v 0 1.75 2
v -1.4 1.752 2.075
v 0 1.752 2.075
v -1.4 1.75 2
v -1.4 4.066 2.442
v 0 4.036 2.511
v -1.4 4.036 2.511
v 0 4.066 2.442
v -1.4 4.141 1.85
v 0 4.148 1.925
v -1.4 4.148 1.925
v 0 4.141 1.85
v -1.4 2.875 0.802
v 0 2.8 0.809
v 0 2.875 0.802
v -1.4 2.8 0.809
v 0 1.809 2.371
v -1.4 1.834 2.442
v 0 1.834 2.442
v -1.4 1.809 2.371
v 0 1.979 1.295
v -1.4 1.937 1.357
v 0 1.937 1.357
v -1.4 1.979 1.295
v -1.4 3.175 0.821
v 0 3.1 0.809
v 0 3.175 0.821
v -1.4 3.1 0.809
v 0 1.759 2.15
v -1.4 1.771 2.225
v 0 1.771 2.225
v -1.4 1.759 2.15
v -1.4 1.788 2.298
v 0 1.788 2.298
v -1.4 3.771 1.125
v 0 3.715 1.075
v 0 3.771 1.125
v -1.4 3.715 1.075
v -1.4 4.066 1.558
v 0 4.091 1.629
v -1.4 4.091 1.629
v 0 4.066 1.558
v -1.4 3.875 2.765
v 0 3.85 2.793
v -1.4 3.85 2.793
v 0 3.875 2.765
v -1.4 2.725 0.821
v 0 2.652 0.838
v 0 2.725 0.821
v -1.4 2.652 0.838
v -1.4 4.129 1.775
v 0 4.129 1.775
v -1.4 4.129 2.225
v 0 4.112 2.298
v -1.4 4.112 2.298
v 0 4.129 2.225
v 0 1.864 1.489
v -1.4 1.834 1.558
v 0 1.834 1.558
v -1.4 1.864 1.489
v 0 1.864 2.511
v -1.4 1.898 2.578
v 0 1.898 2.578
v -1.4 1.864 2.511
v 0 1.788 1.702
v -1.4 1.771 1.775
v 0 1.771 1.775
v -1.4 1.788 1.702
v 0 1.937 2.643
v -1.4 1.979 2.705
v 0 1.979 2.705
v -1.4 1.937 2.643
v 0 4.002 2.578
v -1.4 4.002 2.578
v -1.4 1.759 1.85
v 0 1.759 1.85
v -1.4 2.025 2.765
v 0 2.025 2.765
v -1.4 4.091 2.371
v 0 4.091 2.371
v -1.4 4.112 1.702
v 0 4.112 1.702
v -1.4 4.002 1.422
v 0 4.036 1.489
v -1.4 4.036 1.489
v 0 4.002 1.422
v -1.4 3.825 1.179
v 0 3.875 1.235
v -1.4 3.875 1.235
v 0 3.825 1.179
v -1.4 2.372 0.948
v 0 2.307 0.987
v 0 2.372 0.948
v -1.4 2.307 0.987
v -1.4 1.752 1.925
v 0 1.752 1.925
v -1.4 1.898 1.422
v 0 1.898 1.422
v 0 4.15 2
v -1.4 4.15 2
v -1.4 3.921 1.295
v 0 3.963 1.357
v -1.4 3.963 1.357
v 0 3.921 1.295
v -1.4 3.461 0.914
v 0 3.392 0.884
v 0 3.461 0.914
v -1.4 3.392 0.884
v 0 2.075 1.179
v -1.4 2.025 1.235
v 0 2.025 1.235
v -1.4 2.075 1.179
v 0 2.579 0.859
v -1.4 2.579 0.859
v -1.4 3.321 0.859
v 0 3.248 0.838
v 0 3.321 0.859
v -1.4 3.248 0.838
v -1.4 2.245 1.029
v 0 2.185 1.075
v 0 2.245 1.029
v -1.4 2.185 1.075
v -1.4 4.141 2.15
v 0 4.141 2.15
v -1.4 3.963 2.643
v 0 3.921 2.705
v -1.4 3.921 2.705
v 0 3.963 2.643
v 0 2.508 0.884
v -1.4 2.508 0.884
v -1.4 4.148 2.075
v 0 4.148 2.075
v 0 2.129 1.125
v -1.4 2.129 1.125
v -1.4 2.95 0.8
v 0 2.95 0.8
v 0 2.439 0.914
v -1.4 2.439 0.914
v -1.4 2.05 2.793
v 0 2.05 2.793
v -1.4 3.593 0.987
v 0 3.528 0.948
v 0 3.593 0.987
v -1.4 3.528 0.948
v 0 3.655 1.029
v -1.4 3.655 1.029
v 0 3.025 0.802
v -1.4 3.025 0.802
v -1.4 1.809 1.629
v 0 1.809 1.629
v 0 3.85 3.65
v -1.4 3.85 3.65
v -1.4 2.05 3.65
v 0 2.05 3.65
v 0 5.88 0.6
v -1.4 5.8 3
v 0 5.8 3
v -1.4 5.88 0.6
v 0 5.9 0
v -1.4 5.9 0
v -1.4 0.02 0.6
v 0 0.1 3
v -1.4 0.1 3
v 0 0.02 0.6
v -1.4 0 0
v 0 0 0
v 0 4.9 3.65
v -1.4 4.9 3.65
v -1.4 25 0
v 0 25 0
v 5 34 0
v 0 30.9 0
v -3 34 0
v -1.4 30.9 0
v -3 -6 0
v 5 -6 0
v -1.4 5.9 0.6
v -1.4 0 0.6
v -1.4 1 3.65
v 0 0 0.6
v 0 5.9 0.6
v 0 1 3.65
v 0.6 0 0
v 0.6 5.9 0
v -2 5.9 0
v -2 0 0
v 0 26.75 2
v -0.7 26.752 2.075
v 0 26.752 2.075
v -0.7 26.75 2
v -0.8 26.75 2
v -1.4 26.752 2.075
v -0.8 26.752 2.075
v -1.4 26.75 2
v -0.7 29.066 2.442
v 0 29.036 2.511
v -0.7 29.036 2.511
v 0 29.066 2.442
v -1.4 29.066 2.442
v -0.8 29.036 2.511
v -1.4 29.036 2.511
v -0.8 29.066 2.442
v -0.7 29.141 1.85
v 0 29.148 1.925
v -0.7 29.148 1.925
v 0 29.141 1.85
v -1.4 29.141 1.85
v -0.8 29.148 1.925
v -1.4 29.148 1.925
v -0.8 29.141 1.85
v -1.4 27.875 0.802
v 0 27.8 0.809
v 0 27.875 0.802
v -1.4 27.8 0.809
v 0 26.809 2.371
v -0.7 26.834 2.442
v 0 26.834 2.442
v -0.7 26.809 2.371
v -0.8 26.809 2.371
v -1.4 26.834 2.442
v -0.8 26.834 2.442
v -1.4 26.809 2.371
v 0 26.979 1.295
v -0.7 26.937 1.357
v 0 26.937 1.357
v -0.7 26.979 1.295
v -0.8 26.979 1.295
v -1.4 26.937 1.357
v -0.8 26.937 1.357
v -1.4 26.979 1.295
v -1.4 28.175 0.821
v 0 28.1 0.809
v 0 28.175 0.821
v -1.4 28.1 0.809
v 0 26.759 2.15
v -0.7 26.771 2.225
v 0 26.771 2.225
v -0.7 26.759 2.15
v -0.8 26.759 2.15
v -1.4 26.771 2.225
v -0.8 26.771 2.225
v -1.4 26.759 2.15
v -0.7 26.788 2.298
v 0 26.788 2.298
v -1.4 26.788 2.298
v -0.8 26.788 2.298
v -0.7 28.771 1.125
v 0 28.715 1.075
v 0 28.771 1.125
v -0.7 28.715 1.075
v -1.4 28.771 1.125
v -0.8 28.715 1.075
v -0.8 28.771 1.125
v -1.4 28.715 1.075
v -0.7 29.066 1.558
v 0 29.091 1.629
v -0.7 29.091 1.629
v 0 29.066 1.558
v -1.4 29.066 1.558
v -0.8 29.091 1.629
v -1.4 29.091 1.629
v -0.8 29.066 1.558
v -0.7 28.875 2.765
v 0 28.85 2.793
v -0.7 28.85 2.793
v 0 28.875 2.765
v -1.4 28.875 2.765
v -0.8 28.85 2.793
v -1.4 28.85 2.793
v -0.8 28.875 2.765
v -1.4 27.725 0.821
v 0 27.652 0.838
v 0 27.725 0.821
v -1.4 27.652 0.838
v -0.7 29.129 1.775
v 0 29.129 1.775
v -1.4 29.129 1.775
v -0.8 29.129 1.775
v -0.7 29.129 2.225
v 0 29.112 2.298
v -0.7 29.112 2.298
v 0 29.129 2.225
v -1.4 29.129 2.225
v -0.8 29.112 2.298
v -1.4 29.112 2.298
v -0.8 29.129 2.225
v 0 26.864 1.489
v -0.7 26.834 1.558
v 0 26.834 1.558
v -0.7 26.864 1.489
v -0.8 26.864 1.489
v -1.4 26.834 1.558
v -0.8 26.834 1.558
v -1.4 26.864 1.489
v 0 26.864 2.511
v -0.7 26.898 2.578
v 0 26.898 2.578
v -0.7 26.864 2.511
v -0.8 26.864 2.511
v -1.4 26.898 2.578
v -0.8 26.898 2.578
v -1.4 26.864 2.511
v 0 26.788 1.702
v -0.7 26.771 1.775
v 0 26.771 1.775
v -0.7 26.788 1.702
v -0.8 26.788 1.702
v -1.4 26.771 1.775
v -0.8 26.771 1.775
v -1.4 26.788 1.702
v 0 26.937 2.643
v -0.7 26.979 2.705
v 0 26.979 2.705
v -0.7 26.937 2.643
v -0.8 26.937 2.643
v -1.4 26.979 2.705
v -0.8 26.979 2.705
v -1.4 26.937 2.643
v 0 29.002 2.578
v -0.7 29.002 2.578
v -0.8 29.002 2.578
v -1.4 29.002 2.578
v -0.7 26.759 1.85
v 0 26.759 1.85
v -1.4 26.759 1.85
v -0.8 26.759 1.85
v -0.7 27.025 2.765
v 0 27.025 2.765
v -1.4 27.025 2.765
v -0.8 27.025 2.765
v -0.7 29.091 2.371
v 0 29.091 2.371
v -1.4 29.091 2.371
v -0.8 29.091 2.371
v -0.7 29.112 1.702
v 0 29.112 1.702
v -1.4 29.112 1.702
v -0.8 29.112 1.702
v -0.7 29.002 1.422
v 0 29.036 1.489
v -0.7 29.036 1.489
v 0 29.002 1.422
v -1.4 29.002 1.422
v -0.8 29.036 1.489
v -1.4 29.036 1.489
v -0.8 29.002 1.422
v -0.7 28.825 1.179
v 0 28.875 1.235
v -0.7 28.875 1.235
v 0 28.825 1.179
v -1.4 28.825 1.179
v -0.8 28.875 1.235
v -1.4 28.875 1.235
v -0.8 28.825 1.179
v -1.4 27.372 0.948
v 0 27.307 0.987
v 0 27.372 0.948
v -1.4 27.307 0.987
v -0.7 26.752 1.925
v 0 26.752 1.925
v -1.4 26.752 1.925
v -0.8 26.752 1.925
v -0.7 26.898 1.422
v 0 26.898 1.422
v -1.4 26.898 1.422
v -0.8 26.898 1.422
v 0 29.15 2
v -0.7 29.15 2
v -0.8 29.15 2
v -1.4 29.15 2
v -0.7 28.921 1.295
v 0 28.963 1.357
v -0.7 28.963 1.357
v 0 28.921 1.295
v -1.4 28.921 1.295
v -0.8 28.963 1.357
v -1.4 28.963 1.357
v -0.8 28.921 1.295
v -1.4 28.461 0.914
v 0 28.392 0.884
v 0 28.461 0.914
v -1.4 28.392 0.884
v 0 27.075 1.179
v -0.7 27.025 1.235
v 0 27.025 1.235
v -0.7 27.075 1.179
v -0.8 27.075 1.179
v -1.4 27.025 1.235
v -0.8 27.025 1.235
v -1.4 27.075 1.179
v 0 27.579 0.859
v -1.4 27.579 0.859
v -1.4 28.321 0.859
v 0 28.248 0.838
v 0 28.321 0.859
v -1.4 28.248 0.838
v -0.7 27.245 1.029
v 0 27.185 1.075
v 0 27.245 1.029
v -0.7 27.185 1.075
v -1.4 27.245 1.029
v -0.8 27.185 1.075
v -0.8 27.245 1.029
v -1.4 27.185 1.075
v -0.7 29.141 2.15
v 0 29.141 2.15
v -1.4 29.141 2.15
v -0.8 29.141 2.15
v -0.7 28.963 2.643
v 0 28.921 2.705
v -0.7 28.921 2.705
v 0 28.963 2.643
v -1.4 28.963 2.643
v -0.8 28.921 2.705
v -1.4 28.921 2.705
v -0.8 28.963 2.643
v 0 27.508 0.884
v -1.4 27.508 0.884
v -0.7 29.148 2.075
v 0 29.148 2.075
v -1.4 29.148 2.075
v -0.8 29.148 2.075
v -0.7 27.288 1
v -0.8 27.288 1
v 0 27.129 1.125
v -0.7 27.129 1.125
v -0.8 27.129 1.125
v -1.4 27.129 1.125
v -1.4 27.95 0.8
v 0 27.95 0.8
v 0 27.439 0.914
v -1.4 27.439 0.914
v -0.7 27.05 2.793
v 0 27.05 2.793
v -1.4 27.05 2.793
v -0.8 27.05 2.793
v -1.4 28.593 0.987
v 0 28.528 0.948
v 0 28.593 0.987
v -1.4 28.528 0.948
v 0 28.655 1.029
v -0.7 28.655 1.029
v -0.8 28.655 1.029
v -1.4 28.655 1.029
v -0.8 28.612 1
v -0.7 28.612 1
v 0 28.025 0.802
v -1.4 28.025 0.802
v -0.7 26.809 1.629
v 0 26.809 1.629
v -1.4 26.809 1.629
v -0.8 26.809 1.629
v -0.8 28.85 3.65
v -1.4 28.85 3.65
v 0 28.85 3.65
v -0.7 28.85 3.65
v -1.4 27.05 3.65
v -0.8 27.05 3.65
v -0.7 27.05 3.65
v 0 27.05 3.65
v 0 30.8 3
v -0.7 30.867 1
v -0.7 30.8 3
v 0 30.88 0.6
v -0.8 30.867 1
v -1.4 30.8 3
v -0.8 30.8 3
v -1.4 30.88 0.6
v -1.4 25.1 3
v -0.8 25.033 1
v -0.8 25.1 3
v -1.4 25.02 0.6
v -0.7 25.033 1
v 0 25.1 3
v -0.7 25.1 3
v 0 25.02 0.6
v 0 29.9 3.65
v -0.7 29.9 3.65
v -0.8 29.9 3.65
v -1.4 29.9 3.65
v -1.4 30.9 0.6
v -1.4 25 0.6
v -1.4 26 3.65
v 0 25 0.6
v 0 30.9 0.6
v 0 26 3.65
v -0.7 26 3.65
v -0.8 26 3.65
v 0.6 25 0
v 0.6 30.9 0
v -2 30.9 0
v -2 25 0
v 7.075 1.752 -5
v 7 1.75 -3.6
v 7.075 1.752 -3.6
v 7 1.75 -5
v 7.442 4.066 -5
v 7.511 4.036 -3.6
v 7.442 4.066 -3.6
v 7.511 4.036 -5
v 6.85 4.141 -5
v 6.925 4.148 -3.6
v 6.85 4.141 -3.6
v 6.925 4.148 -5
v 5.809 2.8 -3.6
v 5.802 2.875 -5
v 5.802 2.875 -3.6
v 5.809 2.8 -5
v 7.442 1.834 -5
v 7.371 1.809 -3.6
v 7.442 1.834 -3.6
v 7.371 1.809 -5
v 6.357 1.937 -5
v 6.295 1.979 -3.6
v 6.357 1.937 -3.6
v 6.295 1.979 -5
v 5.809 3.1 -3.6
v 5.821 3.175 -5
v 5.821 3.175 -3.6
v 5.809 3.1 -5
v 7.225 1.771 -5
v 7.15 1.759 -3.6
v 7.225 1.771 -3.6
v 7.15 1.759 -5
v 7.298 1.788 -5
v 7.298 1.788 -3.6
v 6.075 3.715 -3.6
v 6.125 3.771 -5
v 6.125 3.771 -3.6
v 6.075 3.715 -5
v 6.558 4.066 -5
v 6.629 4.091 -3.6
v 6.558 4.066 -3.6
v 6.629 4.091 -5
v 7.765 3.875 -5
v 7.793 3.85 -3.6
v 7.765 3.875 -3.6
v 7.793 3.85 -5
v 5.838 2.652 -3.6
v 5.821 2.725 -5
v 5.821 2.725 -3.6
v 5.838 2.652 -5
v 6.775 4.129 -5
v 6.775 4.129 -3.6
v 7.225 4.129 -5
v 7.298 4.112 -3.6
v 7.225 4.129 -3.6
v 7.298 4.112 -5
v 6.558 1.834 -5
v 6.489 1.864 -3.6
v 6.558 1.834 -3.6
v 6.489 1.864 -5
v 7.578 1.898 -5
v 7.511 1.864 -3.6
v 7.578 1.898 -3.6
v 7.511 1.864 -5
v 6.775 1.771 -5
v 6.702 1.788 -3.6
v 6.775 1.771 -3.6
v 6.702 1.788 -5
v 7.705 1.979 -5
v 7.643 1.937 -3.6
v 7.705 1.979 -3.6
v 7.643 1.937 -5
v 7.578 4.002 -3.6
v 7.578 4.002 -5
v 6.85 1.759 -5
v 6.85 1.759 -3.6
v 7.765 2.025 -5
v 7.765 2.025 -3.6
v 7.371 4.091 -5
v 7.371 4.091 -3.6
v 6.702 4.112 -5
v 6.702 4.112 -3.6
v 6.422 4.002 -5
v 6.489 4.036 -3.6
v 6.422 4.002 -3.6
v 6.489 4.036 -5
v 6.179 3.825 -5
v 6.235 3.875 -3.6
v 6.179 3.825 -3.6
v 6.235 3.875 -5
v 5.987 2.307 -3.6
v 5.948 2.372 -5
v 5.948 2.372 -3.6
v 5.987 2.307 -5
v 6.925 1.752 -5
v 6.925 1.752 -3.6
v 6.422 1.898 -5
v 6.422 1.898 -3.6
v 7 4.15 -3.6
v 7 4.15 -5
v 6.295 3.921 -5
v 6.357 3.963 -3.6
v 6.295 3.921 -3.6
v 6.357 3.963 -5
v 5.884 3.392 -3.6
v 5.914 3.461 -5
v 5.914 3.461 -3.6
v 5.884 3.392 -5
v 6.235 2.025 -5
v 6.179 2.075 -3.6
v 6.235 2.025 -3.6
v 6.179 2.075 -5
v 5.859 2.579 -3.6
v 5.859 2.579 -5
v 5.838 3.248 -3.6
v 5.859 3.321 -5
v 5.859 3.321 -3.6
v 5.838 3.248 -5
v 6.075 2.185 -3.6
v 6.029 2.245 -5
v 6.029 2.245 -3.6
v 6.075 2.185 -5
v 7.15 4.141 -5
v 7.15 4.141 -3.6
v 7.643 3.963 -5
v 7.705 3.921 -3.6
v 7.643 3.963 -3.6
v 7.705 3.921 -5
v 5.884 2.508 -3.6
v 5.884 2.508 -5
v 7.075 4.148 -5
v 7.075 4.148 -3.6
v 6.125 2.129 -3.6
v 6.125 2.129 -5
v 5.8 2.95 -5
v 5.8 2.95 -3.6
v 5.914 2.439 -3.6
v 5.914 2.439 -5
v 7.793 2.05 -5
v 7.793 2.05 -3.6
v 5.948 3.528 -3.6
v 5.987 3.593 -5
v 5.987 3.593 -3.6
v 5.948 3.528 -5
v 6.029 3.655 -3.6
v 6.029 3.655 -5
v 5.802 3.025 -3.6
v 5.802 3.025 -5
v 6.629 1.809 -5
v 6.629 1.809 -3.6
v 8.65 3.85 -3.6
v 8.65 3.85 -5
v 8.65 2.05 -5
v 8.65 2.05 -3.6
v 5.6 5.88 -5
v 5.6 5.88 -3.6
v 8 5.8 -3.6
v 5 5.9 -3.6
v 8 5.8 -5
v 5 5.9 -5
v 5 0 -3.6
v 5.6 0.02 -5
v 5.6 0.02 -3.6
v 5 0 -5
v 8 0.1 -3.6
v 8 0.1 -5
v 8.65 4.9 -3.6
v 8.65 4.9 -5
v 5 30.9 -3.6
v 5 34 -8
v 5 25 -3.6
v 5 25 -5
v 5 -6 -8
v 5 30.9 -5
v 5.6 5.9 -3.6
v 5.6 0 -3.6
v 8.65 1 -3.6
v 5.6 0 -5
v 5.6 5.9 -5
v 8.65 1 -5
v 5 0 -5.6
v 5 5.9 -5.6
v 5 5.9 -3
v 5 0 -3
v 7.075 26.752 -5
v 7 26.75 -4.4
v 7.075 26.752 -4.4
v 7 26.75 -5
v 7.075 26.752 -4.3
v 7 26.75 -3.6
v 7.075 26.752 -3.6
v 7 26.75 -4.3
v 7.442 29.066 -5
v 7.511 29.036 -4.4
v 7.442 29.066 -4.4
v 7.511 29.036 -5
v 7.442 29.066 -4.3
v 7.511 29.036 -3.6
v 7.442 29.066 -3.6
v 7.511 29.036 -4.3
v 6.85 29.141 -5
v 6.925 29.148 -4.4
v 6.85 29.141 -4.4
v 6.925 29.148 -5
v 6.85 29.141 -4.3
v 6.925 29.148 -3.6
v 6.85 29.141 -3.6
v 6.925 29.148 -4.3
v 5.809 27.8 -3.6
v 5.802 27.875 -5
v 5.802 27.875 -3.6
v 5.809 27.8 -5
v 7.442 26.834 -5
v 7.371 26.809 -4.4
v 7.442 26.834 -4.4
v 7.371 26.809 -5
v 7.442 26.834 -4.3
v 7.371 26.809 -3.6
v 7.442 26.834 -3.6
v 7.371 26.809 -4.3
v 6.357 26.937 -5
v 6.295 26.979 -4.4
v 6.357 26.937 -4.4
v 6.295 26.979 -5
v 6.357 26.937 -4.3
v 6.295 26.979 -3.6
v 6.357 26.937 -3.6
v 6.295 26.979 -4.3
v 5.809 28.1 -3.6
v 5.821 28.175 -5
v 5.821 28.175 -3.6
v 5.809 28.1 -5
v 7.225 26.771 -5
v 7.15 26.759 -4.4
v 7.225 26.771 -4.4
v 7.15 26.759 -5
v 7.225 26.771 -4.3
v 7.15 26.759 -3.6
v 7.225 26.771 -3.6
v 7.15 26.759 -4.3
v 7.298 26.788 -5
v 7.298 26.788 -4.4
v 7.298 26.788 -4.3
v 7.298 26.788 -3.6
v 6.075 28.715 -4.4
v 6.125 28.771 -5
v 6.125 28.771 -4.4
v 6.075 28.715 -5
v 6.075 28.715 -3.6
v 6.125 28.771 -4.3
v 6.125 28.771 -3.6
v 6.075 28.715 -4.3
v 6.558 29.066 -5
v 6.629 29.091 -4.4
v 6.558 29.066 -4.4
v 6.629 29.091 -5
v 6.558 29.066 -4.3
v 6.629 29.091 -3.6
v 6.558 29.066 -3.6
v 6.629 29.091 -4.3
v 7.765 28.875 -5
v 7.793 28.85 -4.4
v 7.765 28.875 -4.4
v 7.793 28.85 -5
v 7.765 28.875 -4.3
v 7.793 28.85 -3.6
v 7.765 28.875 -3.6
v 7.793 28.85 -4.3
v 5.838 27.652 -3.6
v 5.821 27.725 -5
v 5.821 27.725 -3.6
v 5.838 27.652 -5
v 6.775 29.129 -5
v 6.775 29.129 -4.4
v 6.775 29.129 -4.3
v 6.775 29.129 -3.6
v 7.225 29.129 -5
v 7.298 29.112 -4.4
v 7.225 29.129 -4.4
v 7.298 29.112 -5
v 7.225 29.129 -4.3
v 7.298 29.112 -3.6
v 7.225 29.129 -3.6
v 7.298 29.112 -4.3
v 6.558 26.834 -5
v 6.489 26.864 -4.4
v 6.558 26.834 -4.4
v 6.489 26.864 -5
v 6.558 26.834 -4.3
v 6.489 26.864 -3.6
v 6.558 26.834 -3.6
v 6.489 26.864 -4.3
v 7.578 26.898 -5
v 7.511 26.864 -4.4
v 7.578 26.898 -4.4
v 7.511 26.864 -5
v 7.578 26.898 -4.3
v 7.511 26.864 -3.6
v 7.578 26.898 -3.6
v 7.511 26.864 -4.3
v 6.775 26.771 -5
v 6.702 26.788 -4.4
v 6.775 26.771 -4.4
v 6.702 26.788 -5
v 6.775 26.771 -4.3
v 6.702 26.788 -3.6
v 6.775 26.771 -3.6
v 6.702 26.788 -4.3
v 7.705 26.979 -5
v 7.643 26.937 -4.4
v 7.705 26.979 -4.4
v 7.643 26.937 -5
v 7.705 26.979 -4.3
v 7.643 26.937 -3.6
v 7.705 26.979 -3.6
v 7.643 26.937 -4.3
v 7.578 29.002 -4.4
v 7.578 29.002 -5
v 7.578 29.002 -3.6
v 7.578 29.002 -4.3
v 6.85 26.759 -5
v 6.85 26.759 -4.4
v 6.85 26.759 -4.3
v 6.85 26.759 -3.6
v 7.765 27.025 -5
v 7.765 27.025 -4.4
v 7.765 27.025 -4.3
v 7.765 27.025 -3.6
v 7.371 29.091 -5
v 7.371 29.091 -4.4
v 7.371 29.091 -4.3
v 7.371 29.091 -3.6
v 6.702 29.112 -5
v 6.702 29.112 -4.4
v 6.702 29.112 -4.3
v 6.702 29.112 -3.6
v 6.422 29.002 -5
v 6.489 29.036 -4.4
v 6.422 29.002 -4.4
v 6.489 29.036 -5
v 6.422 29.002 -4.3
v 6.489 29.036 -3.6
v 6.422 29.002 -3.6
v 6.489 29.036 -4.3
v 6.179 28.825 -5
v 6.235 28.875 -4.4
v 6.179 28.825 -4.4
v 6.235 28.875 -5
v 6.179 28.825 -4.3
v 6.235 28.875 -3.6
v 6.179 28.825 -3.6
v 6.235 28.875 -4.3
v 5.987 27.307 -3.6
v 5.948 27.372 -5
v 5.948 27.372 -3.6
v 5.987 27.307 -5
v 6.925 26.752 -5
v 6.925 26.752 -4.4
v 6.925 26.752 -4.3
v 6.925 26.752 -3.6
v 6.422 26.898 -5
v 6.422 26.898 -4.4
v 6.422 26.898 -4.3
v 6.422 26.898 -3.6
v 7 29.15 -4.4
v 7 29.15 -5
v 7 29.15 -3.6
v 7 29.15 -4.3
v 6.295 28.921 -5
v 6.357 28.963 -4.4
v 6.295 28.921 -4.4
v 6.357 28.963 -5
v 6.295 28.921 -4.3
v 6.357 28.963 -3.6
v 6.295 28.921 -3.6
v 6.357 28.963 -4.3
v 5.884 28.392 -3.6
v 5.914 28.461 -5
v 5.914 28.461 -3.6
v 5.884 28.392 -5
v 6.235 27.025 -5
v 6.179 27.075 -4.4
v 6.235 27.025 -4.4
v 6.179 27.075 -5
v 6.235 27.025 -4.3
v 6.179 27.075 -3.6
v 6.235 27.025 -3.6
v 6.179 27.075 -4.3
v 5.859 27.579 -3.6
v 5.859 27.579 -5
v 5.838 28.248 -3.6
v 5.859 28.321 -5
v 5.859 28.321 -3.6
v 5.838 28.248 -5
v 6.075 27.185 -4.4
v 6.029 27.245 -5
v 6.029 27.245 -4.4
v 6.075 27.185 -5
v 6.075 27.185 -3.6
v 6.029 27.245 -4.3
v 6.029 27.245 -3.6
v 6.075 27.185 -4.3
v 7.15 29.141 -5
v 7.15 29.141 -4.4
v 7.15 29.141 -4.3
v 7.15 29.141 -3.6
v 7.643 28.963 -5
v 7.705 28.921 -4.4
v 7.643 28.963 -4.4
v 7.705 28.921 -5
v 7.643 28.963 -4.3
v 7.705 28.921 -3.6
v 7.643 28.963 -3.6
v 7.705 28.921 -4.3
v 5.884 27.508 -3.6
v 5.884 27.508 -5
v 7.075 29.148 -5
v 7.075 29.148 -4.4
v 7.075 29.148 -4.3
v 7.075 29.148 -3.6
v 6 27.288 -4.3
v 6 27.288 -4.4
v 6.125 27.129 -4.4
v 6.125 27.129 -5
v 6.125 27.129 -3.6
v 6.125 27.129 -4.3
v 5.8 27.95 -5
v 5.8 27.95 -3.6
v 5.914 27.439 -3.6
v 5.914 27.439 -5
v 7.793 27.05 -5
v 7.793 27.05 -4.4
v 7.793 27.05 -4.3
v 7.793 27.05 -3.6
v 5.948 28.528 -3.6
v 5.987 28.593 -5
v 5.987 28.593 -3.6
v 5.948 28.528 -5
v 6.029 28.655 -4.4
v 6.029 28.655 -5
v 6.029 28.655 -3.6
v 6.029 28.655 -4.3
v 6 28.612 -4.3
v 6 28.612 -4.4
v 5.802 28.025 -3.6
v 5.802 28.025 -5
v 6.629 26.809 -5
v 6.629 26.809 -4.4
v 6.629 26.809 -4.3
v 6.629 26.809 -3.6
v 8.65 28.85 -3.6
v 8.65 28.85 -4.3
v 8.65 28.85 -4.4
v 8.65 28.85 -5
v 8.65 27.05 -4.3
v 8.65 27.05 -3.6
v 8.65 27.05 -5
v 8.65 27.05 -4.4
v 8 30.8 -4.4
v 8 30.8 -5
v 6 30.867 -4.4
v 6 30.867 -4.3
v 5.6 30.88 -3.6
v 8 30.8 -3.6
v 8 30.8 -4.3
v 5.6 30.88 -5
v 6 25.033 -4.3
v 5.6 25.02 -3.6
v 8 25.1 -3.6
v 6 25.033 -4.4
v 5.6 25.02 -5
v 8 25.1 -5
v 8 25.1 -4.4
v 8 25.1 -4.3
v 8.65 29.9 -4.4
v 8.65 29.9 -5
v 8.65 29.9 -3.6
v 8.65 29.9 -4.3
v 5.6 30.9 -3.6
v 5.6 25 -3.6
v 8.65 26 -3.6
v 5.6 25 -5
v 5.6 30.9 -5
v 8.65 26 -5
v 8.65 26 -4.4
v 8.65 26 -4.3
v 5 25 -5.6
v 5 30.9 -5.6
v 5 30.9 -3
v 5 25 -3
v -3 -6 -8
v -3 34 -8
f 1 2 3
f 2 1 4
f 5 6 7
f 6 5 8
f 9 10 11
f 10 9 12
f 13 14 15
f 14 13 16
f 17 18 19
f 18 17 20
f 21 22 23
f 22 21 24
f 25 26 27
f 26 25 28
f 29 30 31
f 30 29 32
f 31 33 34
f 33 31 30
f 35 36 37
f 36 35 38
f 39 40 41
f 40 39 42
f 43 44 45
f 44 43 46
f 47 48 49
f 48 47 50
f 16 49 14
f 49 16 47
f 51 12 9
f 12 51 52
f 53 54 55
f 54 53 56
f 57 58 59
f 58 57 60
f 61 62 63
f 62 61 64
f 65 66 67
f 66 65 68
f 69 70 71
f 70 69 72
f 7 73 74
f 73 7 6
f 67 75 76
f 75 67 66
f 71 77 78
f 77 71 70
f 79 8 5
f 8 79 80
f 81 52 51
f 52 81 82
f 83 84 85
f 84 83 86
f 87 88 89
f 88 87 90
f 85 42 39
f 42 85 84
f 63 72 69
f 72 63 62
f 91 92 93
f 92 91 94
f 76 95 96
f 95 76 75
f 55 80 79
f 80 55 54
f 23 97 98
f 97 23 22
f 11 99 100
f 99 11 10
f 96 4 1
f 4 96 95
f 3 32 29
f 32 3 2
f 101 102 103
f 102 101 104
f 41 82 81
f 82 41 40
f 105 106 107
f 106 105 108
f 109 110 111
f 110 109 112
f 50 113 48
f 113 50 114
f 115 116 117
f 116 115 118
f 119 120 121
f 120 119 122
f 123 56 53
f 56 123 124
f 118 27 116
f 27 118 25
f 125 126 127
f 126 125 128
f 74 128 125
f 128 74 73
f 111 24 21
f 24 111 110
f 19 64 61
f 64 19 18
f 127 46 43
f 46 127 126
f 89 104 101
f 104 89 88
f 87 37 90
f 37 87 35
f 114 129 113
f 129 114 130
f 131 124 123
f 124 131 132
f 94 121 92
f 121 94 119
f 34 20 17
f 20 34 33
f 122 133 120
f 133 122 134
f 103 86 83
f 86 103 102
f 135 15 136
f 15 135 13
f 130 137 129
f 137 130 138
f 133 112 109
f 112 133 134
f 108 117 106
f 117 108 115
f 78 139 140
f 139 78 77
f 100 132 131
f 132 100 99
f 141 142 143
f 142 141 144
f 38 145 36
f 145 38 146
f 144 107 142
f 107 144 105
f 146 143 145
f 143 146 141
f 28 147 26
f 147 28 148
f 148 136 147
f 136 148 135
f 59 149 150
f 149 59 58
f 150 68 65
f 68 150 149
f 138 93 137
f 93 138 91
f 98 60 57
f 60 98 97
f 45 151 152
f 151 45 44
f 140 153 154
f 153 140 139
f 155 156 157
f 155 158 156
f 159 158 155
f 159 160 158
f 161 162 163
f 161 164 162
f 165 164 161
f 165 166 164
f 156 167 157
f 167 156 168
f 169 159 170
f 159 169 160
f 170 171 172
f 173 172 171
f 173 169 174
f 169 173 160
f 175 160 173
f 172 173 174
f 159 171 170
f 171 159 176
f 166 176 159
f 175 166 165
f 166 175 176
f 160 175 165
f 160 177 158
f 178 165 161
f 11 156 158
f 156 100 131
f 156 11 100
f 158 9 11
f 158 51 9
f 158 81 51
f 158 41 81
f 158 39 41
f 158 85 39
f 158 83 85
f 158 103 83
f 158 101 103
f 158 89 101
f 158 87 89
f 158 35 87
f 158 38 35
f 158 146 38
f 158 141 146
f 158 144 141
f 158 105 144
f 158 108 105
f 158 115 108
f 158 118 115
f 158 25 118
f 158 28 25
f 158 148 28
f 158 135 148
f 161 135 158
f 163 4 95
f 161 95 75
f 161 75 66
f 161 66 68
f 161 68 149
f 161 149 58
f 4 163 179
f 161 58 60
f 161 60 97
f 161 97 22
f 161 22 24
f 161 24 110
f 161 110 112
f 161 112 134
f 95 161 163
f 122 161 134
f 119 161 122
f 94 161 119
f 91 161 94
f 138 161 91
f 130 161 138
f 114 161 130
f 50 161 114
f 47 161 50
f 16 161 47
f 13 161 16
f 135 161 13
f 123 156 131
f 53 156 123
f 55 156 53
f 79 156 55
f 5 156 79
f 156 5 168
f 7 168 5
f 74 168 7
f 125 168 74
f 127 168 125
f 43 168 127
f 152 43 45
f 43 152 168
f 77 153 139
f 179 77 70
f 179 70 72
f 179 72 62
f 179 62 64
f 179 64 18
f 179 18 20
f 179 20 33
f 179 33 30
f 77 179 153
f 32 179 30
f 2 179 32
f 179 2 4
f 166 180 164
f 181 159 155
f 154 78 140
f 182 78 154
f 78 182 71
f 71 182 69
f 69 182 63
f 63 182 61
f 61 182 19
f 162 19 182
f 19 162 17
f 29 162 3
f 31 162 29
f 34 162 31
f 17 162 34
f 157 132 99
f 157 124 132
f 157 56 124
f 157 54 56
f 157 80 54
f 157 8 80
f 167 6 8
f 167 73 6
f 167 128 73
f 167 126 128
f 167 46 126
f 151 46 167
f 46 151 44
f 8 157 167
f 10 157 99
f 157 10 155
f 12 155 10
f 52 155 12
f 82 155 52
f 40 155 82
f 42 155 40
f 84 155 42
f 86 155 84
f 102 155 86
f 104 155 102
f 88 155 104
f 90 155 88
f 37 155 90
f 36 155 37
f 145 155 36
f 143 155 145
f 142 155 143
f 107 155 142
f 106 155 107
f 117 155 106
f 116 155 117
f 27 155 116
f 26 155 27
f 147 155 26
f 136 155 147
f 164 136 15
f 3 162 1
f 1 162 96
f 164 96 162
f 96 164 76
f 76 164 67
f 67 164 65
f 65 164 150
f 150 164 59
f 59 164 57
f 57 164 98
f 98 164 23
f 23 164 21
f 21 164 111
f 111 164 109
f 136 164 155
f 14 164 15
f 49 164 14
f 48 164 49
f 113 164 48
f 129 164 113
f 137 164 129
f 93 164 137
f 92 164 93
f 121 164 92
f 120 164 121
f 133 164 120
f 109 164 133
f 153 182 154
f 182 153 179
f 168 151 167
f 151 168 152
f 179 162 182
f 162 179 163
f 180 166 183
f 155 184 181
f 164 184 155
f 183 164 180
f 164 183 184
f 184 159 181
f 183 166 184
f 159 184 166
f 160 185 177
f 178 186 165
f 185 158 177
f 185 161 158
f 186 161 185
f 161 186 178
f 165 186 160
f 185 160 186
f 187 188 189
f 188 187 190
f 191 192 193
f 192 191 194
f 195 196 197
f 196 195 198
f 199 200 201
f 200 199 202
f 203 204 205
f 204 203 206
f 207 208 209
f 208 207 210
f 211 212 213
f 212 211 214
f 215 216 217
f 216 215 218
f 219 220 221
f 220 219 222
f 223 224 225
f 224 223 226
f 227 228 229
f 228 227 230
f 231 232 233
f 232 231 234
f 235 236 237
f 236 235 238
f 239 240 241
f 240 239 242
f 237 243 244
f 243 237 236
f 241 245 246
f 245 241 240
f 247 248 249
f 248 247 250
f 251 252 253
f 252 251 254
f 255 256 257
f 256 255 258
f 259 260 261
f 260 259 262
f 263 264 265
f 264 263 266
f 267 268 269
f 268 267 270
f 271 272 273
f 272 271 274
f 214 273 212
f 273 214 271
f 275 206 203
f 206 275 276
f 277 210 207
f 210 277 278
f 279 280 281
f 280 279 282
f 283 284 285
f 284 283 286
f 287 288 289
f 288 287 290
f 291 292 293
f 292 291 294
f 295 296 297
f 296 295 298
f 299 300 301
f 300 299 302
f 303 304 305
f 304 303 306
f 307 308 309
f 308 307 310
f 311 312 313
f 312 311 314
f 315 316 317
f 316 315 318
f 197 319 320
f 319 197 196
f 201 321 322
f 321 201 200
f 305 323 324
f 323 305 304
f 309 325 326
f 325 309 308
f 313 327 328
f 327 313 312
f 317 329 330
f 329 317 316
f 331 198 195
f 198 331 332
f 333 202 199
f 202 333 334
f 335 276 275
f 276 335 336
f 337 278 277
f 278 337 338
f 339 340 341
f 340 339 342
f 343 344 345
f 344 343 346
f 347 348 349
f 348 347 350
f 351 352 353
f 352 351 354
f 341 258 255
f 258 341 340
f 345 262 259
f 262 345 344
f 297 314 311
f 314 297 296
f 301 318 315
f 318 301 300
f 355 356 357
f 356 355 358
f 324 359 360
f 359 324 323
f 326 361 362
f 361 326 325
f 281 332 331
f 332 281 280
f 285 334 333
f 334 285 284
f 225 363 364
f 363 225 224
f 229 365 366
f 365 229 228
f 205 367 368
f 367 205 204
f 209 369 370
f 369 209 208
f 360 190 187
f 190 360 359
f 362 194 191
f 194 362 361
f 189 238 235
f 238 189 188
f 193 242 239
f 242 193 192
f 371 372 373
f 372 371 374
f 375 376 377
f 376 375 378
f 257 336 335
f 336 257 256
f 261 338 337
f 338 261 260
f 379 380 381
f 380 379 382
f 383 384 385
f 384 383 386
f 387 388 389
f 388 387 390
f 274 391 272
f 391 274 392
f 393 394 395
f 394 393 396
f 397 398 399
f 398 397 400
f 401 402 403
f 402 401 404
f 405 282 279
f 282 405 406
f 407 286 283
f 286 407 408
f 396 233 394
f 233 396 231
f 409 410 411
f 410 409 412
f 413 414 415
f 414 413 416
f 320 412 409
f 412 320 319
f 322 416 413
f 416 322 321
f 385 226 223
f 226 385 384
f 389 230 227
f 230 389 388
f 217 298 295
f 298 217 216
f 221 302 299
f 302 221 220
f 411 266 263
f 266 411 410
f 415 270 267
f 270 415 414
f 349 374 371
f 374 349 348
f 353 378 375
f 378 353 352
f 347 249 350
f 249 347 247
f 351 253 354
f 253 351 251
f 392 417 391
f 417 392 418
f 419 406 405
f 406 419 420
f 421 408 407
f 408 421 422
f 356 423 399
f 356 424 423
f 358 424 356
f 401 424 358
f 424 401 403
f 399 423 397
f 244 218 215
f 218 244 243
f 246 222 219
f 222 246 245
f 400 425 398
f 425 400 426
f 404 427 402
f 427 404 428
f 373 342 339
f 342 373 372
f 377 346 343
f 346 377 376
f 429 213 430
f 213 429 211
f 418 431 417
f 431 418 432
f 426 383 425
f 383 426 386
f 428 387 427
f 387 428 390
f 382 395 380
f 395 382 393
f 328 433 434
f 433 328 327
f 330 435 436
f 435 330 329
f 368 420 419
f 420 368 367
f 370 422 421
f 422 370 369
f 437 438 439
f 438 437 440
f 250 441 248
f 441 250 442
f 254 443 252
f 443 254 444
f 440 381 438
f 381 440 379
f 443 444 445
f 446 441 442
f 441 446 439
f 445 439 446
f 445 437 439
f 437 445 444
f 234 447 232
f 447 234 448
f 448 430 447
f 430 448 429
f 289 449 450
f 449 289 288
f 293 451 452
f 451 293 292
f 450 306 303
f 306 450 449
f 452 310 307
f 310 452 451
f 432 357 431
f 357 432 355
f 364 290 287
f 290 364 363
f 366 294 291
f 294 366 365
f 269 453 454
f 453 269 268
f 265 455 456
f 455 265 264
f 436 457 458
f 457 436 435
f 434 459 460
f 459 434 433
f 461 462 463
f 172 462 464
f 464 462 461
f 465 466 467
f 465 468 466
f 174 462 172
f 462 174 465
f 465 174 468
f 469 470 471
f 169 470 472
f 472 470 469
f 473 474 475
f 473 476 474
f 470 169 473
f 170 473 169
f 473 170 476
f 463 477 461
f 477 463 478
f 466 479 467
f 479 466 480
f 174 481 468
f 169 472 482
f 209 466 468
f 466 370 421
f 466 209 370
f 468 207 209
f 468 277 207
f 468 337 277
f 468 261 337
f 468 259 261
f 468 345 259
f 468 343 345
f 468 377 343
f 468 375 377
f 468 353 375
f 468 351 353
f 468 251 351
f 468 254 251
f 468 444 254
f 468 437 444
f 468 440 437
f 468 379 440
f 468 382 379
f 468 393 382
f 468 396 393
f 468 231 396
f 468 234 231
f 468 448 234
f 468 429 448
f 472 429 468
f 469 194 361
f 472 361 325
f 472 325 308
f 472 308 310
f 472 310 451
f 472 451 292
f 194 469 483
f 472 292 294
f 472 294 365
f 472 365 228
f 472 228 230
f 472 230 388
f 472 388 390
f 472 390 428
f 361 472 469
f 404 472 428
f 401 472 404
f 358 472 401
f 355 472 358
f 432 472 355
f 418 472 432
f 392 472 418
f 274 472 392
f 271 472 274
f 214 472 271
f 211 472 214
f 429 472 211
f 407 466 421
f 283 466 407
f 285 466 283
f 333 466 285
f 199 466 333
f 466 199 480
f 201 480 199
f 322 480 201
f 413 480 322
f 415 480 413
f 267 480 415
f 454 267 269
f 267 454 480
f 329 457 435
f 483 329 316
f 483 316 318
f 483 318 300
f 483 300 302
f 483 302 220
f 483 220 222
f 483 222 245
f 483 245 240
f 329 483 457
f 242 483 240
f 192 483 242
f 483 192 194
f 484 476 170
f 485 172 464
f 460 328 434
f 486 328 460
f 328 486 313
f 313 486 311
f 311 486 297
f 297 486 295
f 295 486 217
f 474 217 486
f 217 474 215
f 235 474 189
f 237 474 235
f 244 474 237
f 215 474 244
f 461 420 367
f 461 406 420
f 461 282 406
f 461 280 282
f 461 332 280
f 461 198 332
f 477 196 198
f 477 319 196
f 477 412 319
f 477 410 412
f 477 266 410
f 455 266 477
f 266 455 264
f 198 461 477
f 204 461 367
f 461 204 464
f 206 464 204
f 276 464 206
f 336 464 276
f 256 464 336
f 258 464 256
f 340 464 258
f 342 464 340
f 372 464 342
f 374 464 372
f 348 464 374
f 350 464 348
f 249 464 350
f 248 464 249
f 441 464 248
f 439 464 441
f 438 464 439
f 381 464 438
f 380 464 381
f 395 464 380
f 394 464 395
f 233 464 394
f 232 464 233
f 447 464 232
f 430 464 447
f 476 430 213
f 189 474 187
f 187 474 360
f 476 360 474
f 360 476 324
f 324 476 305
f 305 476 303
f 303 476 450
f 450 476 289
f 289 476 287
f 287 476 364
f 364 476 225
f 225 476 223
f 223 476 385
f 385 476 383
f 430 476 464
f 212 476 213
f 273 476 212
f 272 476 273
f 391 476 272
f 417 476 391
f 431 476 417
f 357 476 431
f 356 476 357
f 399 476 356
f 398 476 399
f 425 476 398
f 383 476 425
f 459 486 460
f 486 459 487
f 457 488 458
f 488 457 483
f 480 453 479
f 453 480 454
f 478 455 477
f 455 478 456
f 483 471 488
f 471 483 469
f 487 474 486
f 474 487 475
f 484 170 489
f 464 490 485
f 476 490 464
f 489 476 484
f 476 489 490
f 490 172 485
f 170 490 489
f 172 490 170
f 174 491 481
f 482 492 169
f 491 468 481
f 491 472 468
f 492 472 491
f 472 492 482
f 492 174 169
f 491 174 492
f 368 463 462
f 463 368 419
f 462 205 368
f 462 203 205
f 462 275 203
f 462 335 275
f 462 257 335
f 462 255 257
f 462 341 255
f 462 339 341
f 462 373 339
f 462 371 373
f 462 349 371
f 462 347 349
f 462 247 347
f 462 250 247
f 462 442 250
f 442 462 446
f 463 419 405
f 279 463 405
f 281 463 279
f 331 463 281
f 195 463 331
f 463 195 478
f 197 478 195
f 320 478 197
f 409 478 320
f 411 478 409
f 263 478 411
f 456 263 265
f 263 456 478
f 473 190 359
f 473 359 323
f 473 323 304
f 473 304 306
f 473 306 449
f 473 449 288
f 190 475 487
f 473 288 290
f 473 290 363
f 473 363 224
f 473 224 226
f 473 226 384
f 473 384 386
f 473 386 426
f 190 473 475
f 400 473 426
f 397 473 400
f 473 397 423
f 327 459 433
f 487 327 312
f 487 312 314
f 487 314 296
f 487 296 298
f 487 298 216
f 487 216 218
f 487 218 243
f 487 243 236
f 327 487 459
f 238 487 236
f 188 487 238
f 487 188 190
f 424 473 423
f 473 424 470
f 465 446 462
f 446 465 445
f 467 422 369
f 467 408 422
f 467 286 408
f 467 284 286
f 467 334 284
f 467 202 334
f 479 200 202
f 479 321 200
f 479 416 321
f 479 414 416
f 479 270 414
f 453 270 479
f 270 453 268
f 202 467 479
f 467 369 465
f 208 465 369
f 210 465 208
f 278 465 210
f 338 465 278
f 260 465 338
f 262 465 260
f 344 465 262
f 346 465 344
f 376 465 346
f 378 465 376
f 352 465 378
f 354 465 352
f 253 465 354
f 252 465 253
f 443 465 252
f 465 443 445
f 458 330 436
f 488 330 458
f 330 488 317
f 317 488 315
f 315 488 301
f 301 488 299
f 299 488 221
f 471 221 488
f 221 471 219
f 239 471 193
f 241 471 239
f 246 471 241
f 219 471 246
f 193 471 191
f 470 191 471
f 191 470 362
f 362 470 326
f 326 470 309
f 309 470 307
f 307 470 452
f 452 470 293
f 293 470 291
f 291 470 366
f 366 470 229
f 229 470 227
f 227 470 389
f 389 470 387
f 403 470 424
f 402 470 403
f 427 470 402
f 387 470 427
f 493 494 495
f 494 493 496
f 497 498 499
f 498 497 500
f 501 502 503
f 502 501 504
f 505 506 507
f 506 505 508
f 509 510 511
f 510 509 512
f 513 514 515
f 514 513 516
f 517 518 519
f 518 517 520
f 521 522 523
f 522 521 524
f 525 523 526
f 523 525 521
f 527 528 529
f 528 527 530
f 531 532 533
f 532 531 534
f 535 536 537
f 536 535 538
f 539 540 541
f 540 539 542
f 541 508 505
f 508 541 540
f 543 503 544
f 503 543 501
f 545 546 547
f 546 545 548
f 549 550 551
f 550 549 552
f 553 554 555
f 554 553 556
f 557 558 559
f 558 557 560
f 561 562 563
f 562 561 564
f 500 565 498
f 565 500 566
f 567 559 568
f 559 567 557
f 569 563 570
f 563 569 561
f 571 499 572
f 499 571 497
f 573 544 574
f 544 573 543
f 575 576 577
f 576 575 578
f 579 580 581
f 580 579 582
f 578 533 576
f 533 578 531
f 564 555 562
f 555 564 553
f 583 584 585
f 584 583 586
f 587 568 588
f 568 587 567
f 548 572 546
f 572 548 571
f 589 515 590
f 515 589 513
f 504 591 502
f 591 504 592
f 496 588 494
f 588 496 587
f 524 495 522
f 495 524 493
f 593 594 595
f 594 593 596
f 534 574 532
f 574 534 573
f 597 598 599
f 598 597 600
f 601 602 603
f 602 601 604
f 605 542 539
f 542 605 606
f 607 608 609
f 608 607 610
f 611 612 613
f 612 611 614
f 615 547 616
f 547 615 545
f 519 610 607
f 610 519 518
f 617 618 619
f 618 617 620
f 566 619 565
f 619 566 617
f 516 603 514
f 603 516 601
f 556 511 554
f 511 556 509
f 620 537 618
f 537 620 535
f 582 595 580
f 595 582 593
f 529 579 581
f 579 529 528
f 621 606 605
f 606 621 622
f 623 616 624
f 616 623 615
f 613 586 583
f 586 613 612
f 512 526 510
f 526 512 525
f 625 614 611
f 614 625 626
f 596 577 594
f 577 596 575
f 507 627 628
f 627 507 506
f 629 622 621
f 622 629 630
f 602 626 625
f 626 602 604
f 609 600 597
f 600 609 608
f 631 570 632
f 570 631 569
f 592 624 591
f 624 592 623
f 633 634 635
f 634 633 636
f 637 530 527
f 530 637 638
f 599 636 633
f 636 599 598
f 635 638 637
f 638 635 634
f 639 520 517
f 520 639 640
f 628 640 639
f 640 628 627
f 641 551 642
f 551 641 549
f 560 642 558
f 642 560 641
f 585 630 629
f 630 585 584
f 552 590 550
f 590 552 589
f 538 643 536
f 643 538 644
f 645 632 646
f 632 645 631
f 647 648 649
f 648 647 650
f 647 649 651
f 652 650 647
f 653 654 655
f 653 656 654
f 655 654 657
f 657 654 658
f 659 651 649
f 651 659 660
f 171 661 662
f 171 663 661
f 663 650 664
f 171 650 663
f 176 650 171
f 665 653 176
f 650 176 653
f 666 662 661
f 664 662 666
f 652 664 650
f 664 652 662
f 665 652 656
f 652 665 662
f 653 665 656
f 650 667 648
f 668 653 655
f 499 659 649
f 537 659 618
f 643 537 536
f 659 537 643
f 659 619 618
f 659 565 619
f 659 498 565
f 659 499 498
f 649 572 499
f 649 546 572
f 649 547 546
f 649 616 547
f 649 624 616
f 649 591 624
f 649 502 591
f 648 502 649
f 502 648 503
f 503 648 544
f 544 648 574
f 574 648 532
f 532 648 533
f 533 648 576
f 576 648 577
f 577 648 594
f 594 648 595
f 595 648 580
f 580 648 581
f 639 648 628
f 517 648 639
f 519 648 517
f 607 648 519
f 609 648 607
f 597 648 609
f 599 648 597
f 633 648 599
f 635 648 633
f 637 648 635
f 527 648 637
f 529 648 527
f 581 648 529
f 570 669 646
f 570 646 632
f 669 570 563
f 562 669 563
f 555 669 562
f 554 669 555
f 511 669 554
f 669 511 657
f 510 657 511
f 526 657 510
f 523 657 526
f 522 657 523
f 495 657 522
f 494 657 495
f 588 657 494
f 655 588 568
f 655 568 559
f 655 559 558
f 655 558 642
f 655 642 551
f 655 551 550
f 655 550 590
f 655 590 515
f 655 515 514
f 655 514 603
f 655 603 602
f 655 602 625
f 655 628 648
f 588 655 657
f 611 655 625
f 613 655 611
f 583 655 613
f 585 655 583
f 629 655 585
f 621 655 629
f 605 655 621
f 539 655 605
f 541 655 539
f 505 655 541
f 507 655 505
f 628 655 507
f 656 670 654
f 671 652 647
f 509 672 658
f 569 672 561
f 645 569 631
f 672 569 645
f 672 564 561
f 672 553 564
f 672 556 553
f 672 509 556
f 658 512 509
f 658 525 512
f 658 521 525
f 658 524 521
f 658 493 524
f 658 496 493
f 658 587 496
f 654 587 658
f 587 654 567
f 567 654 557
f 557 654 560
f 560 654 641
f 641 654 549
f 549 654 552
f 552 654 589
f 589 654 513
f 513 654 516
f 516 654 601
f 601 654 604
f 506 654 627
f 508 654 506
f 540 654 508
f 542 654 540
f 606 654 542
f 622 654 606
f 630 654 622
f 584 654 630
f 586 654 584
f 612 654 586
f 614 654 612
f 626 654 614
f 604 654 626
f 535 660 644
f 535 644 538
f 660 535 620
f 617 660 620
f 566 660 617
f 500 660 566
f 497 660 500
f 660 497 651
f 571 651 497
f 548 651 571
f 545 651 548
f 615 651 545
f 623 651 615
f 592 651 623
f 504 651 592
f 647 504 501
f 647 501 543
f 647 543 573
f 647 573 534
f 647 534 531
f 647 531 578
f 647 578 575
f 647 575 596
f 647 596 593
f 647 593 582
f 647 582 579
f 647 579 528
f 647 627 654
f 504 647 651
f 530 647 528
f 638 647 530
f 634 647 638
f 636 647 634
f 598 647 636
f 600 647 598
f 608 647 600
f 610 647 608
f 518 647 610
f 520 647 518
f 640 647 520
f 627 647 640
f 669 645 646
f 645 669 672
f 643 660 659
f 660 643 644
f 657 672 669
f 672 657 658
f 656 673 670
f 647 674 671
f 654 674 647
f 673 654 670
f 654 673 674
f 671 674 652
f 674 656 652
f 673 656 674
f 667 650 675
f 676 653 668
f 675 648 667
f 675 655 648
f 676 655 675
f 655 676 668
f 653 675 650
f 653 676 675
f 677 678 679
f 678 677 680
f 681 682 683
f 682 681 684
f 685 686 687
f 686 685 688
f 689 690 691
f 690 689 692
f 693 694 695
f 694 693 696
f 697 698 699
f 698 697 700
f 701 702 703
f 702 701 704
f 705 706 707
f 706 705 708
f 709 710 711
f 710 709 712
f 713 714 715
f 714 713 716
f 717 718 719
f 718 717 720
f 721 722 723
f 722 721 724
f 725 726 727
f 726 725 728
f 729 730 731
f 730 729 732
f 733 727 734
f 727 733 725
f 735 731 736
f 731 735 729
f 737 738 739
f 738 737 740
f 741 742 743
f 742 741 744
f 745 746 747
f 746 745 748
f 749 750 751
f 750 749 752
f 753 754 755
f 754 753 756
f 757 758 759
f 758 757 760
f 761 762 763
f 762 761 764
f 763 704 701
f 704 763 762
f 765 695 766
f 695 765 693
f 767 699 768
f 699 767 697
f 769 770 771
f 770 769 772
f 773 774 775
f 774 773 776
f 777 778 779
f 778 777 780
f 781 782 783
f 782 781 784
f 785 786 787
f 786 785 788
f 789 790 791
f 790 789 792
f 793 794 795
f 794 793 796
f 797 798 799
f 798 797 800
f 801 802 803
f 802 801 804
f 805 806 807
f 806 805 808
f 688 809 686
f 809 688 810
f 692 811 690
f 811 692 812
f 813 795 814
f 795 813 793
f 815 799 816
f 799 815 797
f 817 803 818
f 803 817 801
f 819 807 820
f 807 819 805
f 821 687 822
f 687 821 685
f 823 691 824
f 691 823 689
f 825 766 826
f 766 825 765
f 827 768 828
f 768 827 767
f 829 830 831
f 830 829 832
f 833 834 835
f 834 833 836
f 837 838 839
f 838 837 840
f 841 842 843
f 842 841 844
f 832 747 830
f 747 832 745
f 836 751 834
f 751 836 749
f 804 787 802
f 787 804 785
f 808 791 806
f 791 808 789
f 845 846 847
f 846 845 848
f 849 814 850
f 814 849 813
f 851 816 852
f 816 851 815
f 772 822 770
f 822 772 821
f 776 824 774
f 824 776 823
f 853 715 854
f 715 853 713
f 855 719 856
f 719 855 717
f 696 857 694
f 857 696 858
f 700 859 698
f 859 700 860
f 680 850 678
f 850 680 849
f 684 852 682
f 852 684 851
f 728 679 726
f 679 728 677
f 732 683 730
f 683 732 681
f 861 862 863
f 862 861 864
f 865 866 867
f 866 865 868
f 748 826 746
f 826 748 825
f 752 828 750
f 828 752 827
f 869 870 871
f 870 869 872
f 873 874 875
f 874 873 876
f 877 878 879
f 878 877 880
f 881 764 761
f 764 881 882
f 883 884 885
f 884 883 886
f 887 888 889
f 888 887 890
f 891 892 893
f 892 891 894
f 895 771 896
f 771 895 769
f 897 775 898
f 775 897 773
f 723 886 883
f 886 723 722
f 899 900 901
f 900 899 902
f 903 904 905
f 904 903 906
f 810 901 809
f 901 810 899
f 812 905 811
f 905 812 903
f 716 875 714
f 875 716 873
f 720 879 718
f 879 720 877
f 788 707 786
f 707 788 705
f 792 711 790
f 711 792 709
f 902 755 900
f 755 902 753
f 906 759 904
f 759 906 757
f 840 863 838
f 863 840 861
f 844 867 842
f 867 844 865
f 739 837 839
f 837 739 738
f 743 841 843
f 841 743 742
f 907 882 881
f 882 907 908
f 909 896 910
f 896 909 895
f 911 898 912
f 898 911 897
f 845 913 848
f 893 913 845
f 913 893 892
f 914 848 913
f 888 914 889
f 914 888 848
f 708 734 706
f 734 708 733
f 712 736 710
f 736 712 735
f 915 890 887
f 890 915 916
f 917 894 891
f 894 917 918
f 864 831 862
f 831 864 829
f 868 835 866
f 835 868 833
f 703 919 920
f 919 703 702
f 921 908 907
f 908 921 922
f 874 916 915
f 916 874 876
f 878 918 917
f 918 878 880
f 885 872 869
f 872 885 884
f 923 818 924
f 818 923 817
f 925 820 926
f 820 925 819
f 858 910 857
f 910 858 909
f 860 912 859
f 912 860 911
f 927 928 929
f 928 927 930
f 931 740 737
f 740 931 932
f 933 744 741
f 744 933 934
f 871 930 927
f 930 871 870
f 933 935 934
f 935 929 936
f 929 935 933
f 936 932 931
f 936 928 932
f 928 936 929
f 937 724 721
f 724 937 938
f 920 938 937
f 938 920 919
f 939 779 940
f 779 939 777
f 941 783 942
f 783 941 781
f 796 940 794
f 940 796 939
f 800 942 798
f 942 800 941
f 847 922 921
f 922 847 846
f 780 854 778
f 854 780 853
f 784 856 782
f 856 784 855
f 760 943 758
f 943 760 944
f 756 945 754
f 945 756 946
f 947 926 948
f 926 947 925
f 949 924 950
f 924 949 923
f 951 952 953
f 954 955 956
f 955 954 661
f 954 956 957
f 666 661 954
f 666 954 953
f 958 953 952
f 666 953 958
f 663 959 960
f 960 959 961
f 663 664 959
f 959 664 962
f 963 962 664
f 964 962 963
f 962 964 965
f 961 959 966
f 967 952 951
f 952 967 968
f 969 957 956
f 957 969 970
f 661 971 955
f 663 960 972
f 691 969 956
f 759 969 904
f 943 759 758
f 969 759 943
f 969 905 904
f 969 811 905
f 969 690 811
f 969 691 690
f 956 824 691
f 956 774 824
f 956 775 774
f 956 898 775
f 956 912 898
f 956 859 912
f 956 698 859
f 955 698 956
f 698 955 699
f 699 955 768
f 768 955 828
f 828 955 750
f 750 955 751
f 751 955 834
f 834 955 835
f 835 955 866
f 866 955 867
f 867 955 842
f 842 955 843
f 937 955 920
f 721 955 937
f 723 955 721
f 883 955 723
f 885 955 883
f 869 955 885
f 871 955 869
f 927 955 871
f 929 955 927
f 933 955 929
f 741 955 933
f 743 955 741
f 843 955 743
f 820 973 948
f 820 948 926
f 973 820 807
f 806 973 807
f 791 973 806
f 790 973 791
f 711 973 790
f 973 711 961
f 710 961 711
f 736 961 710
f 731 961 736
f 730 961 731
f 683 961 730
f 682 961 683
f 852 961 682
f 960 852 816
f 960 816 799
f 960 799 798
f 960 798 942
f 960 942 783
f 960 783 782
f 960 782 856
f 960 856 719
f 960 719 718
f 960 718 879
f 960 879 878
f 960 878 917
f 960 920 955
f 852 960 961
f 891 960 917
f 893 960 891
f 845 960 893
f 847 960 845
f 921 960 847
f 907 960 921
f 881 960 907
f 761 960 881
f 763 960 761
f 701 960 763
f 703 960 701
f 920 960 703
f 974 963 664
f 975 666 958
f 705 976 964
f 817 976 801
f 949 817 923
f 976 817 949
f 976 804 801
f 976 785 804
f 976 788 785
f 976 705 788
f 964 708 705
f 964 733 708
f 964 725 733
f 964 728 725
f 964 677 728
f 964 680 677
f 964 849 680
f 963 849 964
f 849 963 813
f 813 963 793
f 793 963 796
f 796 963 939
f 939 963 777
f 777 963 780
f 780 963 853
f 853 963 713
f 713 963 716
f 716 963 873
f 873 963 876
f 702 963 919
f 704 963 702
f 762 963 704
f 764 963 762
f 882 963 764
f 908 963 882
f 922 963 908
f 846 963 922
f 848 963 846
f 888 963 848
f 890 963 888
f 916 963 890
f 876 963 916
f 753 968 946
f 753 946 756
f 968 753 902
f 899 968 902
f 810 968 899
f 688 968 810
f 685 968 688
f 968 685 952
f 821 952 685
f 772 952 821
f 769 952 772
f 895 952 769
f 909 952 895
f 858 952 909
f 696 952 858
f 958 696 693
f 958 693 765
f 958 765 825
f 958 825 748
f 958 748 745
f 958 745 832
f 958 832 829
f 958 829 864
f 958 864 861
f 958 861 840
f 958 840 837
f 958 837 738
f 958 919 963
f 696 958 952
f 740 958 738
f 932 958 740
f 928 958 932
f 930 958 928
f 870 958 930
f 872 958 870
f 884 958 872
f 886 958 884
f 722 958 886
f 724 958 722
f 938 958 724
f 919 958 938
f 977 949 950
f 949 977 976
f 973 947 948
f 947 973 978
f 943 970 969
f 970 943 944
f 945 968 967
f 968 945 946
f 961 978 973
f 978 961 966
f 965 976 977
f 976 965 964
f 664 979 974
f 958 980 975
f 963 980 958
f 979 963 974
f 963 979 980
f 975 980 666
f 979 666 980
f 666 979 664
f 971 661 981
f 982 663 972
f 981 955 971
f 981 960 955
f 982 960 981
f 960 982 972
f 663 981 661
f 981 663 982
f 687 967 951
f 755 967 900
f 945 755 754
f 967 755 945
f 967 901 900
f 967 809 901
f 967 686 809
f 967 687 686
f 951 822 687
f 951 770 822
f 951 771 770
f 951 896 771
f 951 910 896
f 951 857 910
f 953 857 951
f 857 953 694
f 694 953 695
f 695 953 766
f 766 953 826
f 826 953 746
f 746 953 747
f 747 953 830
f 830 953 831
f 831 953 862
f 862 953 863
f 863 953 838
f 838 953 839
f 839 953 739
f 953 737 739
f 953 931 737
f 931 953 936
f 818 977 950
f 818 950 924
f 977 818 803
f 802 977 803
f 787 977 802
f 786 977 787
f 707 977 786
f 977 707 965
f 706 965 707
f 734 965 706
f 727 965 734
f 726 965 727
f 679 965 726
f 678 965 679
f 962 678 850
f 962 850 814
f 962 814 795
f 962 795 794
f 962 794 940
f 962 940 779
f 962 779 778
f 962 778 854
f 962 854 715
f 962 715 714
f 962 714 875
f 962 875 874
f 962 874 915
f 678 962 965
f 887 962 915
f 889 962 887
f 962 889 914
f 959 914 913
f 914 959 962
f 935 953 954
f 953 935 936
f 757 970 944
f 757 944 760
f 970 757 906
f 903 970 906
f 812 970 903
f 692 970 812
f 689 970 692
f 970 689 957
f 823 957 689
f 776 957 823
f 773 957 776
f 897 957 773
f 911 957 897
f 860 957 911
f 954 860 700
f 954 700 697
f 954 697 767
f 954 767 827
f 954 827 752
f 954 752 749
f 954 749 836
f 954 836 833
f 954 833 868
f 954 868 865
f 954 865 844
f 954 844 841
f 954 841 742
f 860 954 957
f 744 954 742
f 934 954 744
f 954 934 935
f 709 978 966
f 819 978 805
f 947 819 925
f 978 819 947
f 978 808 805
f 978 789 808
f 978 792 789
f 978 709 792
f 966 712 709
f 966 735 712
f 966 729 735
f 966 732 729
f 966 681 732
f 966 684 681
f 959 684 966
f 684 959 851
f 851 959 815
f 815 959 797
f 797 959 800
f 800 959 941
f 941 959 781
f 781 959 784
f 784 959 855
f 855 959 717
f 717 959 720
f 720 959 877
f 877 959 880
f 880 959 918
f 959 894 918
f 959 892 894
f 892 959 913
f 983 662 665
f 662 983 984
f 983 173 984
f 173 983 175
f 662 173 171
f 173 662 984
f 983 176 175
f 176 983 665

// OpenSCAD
$fn = 100; // render resolution

module clip(width=2, length=5.9) {
    union() {
    rotate([0,-90,0])
    difference() {
        linear_extrude(width) // 1.5 would be ideal but I guess it is too thing to provide the structural integrity
            polygon(points=[
                    [0, 0],
                    [0, length],
                    [3, length-.1],
                    [3.65, length - 1],

                    [3.65, 1],
                    [3, 0.1],
                ]);

        union() {
            translate([2,length/2,-5])
                cylinder(d=2.4, h=10, center=false, $fn=100); // d3 is too much

            w=1.8;
            translate([2,length/2 - w/2,-5])
                cube([2,w,10], center=false);
        }
    }


    hook=.6;
    translate([0,0,hook])
    rotate([90,180,180])
    linear_extrude(length)
    polygon(points=[
            [0, 0],
            [0, hook],
            [hook, hook],
        ]);

    translate([-width,length,hook])
    rotate([90,180,0])
        linear_extrude(length)
            polygon(points=[
                    [0, 0],
                    [0, hook],
                    [hook, hook],
                ]);
    }
}

translate([0,15,0])
difference() {
    translate([0,10,0])
        clip(width=1.4);

    translate([-.8,9,1])
        cube([.1,8,10]);
}

clip(width=1.4);

rotate([0,90,0])
translate([5,0,5]) {
    translate([0,15,0])
        difference() {
            translate([0,10,0])
                clip(width=1.4);

            translate([-.7,9,1])
                cube([.1,8,10]);
        }

    clip(width=1.4);
}

translate([-3,-6,-8])
cube([8,40,8]);
